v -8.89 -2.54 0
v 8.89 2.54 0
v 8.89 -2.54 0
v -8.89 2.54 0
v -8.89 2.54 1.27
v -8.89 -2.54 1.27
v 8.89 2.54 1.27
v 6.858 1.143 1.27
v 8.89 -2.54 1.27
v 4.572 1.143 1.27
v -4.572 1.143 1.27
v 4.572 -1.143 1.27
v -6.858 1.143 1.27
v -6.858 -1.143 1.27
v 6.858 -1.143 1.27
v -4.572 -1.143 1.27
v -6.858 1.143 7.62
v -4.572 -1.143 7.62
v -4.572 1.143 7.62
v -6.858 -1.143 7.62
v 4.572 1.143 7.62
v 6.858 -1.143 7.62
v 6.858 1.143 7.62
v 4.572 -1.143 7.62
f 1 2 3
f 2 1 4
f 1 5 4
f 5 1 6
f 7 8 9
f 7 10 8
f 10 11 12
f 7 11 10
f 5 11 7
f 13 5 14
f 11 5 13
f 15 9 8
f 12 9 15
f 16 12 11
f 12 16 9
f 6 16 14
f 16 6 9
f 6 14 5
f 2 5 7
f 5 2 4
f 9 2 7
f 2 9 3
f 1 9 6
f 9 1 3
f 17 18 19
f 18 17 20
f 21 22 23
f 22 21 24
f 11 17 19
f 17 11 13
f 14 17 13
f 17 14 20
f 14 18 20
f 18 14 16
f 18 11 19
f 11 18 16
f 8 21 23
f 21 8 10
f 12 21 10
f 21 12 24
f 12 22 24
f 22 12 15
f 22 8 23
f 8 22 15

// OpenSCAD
ViewScale = [0.0254, 0.0254, 0.0254];

INSERTLENGTH=440;

module insertwall()
{
    square([544, 200], center=true);
    translate([744/2-100, 0, 0]) {
        circle(100, $fn=96);
        square([100, 100]);
    }

    translate([-544/2, 0, 0]) 
    rotate([0, 0, 90]) {
        circle(100, $fn=96);
        square([100, 100]);
    }
}

module strap()
{
    // front wall
    linear_extrude(120) {
        square([800, 310], center=true);
        translate([450, 0, 0])
        square([100, 310], center=true);
        translate([-450, 0, 0])
        square([100, 310], center=true);
    }
    // sides
    translate([0, 0, 120])
        linear_extrude(330) {
        translate([450, 0, 0])
        square([100, 310], center=true);
        translate([-450, 0, 0])
        square([100, 310], center=true);
    }
    // cross bits
    translate([-335, 0, 20+330])
    linear_extrude(100) 
    square([140, 310], center=true);

    translate([335, 0, 20+330])
    linear_extrude(100) 
    square([140, 310], center=true);
    
}

module holder()
{
    linear_extrude(50)
    square([700, 200], center=true);
    translate([-225, 0, 50])
    linear_extrude(250){
    square(90, center=true);
    translate([450, 0, 0])
    square(90, center=true);
    }
}

module insert()
{
    // front wall
    linear_extrude(80) insertwall();
    // side walls
    translate([0, 0, 80])
    linear_extrude(INSERTLENGTH-80)
    difference() {
        insertwall();
        square([544, 204], center=true);
    }

    translate([0, 0, INSERTLENGTH+20+330+100])
    rotate([180, 0, 0])
    strap();
}

scale(ViewScale)
{
    *insert();
    //translate([1000, 0, 0])
    holder();
}
